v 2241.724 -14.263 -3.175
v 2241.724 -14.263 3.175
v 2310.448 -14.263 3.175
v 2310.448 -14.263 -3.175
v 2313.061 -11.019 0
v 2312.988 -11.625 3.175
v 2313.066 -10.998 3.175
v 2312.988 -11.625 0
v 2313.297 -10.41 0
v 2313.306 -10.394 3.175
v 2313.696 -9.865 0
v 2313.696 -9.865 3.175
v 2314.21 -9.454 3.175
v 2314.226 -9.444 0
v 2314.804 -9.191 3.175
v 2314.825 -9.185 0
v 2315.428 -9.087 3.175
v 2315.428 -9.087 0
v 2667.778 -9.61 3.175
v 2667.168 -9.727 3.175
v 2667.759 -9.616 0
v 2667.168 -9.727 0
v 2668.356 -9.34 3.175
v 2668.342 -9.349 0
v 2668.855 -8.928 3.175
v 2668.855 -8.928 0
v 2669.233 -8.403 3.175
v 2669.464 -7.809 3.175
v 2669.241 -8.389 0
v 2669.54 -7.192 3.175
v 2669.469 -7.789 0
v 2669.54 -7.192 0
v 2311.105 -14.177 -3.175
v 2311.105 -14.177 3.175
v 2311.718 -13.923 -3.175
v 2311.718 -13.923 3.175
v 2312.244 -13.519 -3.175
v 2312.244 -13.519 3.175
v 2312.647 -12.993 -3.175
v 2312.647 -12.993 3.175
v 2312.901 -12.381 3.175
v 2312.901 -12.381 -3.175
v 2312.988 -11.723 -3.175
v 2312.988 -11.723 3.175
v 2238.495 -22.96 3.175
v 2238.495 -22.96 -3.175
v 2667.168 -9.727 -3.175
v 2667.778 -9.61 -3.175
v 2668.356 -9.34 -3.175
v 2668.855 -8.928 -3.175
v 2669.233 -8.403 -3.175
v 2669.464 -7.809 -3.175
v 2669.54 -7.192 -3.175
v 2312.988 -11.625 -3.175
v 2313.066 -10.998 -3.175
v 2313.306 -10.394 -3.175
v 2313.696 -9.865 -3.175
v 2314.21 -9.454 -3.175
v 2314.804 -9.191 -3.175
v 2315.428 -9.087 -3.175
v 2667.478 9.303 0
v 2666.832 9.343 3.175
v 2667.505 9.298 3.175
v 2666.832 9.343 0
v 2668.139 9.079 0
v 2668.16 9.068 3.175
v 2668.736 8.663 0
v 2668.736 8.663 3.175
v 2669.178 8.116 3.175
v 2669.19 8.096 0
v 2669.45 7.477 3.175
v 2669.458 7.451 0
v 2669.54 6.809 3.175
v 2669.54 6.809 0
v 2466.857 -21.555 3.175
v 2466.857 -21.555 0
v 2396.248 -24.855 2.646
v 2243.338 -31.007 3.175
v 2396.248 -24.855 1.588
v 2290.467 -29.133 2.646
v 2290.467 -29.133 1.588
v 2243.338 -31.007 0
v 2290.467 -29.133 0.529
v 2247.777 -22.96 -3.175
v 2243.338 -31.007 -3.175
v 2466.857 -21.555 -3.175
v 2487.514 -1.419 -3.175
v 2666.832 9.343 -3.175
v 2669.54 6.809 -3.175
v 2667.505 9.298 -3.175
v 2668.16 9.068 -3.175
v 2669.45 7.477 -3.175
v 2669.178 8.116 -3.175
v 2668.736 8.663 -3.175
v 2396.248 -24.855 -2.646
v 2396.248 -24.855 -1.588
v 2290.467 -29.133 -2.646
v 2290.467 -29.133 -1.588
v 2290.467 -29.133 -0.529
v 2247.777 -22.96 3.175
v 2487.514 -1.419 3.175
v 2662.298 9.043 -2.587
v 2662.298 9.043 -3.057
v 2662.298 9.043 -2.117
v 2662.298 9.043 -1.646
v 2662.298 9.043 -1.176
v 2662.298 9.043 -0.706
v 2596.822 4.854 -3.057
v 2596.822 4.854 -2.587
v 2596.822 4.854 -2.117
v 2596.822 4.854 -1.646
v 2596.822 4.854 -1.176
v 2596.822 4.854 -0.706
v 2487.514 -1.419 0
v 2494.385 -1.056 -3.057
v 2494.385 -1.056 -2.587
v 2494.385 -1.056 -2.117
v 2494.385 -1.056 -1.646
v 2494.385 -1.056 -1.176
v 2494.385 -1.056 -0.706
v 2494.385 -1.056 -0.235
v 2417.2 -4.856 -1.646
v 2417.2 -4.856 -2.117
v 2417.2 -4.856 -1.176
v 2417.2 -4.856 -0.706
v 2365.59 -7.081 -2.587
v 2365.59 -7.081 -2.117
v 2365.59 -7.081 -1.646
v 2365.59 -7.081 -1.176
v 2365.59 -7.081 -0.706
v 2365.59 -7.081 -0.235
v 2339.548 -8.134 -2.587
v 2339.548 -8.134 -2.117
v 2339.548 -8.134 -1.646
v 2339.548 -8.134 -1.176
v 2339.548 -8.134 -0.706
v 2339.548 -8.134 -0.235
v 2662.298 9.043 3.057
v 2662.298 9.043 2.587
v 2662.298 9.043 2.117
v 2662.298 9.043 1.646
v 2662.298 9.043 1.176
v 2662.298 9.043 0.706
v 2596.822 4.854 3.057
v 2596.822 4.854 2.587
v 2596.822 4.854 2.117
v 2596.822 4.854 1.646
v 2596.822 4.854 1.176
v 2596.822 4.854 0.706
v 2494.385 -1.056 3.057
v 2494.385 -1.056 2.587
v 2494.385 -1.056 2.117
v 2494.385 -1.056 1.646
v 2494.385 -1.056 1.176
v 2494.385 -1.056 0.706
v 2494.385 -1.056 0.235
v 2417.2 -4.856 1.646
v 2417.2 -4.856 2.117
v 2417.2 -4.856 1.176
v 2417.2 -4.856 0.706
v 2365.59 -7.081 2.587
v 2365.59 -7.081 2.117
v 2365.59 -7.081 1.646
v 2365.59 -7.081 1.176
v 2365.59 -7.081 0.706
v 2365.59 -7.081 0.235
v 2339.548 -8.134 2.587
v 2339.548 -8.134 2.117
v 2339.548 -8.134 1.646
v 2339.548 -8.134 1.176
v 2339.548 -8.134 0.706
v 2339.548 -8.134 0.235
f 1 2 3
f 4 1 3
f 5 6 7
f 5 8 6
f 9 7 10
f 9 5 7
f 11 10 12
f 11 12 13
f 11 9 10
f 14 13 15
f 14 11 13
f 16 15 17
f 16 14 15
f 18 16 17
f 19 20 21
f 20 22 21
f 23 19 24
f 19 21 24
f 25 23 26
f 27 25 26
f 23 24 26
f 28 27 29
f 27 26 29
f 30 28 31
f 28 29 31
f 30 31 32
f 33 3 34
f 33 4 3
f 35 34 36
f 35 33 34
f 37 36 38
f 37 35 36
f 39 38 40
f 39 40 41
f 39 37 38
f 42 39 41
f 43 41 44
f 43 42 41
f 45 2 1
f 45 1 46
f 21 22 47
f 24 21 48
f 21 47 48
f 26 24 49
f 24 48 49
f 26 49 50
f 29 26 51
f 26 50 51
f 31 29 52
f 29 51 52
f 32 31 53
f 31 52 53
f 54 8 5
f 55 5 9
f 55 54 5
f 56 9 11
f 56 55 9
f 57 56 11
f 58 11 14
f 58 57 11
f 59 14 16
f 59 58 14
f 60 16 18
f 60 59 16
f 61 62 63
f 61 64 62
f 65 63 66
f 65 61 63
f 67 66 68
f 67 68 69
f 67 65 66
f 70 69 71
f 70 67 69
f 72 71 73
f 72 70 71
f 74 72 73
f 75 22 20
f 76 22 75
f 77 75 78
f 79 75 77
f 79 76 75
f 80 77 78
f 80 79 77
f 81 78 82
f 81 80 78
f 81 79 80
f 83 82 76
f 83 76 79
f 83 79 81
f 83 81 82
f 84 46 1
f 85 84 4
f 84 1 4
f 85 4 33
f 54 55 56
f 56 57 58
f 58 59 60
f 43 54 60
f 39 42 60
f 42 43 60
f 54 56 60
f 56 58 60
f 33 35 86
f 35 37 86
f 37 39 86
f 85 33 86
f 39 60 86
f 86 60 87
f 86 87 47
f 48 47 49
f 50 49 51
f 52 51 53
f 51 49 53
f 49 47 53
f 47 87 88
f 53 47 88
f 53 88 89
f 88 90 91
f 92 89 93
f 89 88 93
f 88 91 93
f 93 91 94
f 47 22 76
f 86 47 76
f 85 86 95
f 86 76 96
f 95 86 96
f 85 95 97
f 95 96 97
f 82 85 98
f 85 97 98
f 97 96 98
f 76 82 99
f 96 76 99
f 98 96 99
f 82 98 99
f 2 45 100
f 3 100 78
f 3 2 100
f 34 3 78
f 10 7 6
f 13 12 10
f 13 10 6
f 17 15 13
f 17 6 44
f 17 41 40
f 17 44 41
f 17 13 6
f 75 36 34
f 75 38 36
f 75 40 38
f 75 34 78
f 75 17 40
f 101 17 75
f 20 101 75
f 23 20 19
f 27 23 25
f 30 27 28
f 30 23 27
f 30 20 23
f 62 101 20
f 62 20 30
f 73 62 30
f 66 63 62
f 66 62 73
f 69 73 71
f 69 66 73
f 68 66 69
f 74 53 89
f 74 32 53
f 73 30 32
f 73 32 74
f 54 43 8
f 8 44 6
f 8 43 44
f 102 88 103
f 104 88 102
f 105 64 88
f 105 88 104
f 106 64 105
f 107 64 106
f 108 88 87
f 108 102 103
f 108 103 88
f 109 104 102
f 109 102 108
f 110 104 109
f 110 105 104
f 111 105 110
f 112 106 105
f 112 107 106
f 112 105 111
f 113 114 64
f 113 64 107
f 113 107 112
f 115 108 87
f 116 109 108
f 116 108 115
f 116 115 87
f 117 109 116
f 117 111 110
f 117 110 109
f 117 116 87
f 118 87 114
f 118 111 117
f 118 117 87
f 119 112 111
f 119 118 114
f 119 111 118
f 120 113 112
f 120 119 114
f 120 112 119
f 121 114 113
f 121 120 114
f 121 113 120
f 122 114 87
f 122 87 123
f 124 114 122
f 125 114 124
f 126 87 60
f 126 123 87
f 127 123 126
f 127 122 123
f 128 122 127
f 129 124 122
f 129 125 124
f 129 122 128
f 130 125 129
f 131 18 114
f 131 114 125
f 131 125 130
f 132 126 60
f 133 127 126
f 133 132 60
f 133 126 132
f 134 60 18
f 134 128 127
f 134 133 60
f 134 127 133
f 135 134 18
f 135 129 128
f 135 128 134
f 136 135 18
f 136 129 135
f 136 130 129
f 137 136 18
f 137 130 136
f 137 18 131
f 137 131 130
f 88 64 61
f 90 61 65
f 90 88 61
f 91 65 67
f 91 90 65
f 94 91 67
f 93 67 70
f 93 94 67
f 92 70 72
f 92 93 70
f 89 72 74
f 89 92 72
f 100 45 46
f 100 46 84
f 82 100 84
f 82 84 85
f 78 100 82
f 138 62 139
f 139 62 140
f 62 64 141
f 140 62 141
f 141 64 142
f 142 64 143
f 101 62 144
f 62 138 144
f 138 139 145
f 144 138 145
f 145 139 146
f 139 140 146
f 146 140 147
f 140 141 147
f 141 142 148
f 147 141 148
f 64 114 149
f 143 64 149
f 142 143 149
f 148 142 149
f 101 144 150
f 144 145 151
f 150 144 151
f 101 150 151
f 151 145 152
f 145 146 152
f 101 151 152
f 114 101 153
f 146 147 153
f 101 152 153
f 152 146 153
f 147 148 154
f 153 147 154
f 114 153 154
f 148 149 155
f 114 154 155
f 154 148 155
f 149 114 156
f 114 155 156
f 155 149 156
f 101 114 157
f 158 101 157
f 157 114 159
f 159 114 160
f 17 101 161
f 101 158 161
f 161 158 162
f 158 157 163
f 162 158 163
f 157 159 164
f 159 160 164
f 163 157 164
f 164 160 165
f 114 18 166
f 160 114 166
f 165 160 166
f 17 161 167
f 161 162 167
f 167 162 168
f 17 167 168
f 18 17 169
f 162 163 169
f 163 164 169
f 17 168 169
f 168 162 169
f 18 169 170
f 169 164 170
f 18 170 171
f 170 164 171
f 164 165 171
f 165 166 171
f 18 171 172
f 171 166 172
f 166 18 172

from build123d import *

# Parameters (mm, degrees)
BOSS_EXTRUDE1_DEPTH = 3.175
CUT_EXTRUDE1_DEPTH  = 7.3500001
FILLET1_R           = 2.54
CUT_EXTRUDE2_DEPTH  = 7.62


with BuildPart() as part:
    # Sketch1 → Boss-Extrude1 (new body, symmetric)
    with BuildSketch(Plane.XY):
        with BuildLine():
            Line((499.61002795, -53.470702797), (1046.28548189, -53.470702797))
            add(Edge.make_bspline(
                [(2669.54, -9.569049356), (2615.393603553, -13.17073937), (2561.080658619, -16.536108081), (2506.205230446, -19.758621957), (2430.209106802, -23.505211705), (2354.212983157, -26.631486423), (2332.570330468, -27.480988169), (2156.268639429, -34.377768543), (1979.966947376, -41.628631248), (1824.114277635, -52.771265877), (1636.928606778, -53.579569849), (1449.742935921, -53.454024613), (1418.006730935, -53.470702797), (1324.899336146, -53.470702797), (1231.791940344, -53.470702797), (1170.441269319, -53.470702797), (1108.784075813, -53.470702797), (1047.126882346, -53.470702797), (1046.846414188, -53.470702797), (1046.565947184, -53.470702797), (1046.28548189, -53.470702797)],
                knots=[103.698913506, 103.698913506, 103.698913506, 103.698913506, 103.698913506, 103.698913506, 130.927896619, 130.927896619, 130.927896619, 141.337054719, 141.337054719, 141.337054719, 218.101815019, 218.101815019, 218.101815019, 233.772059419, 233.772059419, 233.772059419, 264.077723219, 264.077723219, 264.077723219, 264.2162088, 264.2162088, 264.2162088, 264.2162088, 264.2162088, 264.2162088], degree=5))
            Line((2669.54, -9.569049356), (2669.54, 9.5231025))
            add(Edge.make_bspline(
                [(2669.54, 9.5231025), (2667.126494524, 9.36235515), (2659.861586685, 8.880281494), (2635.666282302, 7.292469146), (2596.857665529, 4.826056853), (2545.729743039, 1.758344093), (2494.405305707, -1.098555235), (2451.533022267, -3.266573297), (2417.198316756, -4.86708361), (2391.457076919, -6.003589235), (2365.634736307, -7.086854581), (2339.546284672, -8.137729944), (2313.466132974, -9.165138371), (2287.612375486, -10.179478215), (2261.763347437, -11.201032297), (2227.285329715, -12.583842557), (2184.175569393, -14.36607236), (2132.429066114, -16.607427868), (2063.4255234, -19.708920485), (1977.174907635, -23.700543313), (1873.732451432, -28.149389221), (1770.37461881, -31.657468649), (1667.085687813, -33.793117556), (1581.011094491, -34.383188831), (1512.07397126, -34.4278026), (1443.061513477, -34.409510402), (1356.800927879, -34.424432812), (1218.794626954, -34.418464788), (1115.289022786, -34.420702797), (1046.28548189, -34.420702797)],
                knots=[103.571582669, 103.571582669, 103.571582669, 103.571582669, 104.300777207, 105.766098403, 110.877392287, 115.98868617, 121.099980054, 126.211273938, 128.76692088, 131.322567822, 133.878214764, 136.433861706, 138.989508647, 141.545155589, 144.100802531, 146.656449473, 151.767743357, 156.879037241, 161.990331124, 172.212918892, 182.43550666, 192.658094427, 202.880682195, 213.103269962, 218.214563846, 223.32585773, 233.548445497, 243.771033265, 264.2162088, 264.2162088, 264.2162088, 264.2162088], degree=3))
            Line((1046.28548189, -34.420702797), (499.61002795, -34.420702797))
            add(Edge.make_bspline(
                [(499.61002795, -34.420702797), (488.614737518, -34.420702797), (472.236395365, -34.420702798), (449.940231846, -34.420702794), (427.771305695, -34.42070281), (405.874681663, -34.420702712), (384.584909128, -34.420702942), (368.900229326, -34.420702244), (353.376568613, -34.420704862), (332.608466435, -34.420689186), (306.287754853, -34.420570006), (274.023487704, -34.420538256), (252.271015965, -34.420709741), (241.425150134, -34.420702761)],
                knots=[19.90682951, 19.90682951, 19.90682951, 19.90682951, 23.220120017, 24.876765271, 26.533410525, 29.846701033, 31.503346286, 33.15999154, 34.816636794, 36.473282048, 39.786572556, 43.099863063, 46.413153571, 46.413153571, 46.413153571, 46.413153571], degree=3))
            add(Edge.make_bspline(
                [(241.425150134, -34.420702761), (239.394928853, -34.420701455), (235.322322927, -34.420495867), (227.274423443, -34.398702533), (217.319360062, -34.297466855), (205.530690077, -33.976385563), (189.963341914, -33.212641271), (170.696984653, -31.543495194), (147.533261232, -28.314398128), (125.482753206, -24.202109872), (109.358914834, -20.622537553), (100.964116069, -18.612521054), (99.06, -18.149327722)],
                knots=[0, 0, 0, 0, 0.622088422, 1.244176844, 2.488353689, 3.732530533, 4.976707377, 7.465061066, 9.953414755, 12.441768444, 14.55823542, 15.180323842, 15.180323842, 15.180323842, 15.180323842], degree=3))
            Line((99.06, -18.149327722), (99.06, -37.741485304))
            add(Edge.make_bspline(
                [(241.425137875, -53.470702761), (224.286916993, -53.470691732), (207.149474967, -53.467315374), (190.203897513, -52.686577078), (161.734965878, -49.987457476), (133.266034188, -45.175583375), (121.749620566, -42.910592695), (110.349390726, -40.420274627), (99.06, -37.741485304)],
                knots=[0, 0, 0, 0, 0, 0, 8.71381608, 8.71381608, 8.71381608, 14.701907176, 14.701907176, 14.701907176, 14.701907176, 14.701907176, 14.701907176], degree=5))
            add(Edge.make_bspline(
                [(499.61002795, -53.470702797), (492.136820835, -53.470702797), (484.754348064, -53.470702797), (477.443025859, -53.470702797), (448.516583145, -53.470702797), (419.590140517, -53.470702797), (398.368118521, -53.470702797), (355.647540186, -53.470702797), (312.926961851, -53.470702797), (289.235090436, -53.470293029), (265.364963651, -53.470705034), (241.4948369, -53.470702789), (241.471603891, -53.470702785), (241.448370882, -53.470702776), (241.425137875, -53.470702761)],
                knots=[19.90682951, 19.90682951, 19.90682951, 19.90682951, 19.90682951, 19.90682951, 23.637897311, 23.637897311, 23.637897311, 34.276545571, 34.276545571, 34.276545571, 46.401340901, 46.401340901, 46.401340901, 46.413153571, 46.413153571, 46.413153571, 46.413153571, 46.413153571, 46.413153571], degree=5))
        make_face()
    extrude(amount=BOSS_EXTRUDE1_DEPTH, both=True)

    # Sketch2 → Cut-Extrude1 (cut, through all)
    with BuildSketch(Plane.XY.offset(3.175)):
        with BuildLine():
            add(Edge.make_bspline(
                [(2312.9875, -9.183260037), (2304.505441691, -9.516700376), (2287.441020622, -10.186250162), (2261.763347437, -11.201032297), (2228.230552004, -12.545932515), (2203.310445107, -13.575047161), (2187.00995947, -14.263260037)],
                knots=[139.04033329, 139.04033329, 139.04033329, 139.04033329, 141.545155589, 144.100802531, 146.656449473, 151.487488909, 151.487488909, 151.487488909, 151.487488909], degree=3))
            Line((2187.00995947, -14.263260037), (2312.9875, -14.263260037))
            Line((2312.9875, -14.263260037), (2312.9875, -9.183260037))
        make_face()
    extrude(amount=-CUT_EXTRUDE1_DEPTH, mode=Mode.SUBTRACT)

    # Fillet1
    fillet1_edges = [part.edges().sort_by_distance(p)[0] for p in [
        (2669.54, -9.569049356, -1.5875),
        (2669.54, 9.5231025, -1.5875),
        (99.06, -37.741485304, -1.5875),
        (99.06, -18.149327722, -1.5875),
        (2312.9875, -9.183260037, 1.5875),
        (2312.9875, -14.263260037, 0),
    ]]
    fillet(fillet1_edges, radius=FILLET1_R)

    # Sketch3 → Cut-Extrude2 (cut)
    with BuildSketch(Plane.XY.offset(3.175)):
        Polygon((2241.72424439, -14.263260032), (2238.495432608, -22.960040401), (2247.777444945, -22.960040401), (2243.337690155, -31.006850231), (2243.337690155, -46.204944132), (-44.767190061, -591.123475599), (-136.430103916, 149.230828615), (2241.72424439, 0), align=None)
    extrude(amount=-CUT_EXTRUDE2_DEPTH, mode=Mode.SUBTRACT)


solid = part.part
